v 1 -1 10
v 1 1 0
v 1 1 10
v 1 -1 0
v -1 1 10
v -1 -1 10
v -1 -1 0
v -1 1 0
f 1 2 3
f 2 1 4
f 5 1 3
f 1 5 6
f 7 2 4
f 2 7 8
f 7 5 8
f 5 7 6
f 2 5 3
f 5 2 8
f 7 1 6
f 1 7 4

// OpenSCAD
translate([0, 0, 5]) color([0,1,0,0.9]) cube([2, 2, 10], center=true);
translate([-0.25, -0.25, 1]) color([1,0,0]) cube([0.5, 0.5, 2], center=true);
translate([-0.75, -0.25, 1]) color([1,0,0]) cube([0.5, 0.5, 2], center=true);
translate([-0.25, -0.75, 1]) color([1,0,0]) cube([0.5, 0.5, 2], center=true);
translate([-0.75, -0.75, 1]) color([1,0,0]) cube([0.5, 0.5, 2], center=true);
